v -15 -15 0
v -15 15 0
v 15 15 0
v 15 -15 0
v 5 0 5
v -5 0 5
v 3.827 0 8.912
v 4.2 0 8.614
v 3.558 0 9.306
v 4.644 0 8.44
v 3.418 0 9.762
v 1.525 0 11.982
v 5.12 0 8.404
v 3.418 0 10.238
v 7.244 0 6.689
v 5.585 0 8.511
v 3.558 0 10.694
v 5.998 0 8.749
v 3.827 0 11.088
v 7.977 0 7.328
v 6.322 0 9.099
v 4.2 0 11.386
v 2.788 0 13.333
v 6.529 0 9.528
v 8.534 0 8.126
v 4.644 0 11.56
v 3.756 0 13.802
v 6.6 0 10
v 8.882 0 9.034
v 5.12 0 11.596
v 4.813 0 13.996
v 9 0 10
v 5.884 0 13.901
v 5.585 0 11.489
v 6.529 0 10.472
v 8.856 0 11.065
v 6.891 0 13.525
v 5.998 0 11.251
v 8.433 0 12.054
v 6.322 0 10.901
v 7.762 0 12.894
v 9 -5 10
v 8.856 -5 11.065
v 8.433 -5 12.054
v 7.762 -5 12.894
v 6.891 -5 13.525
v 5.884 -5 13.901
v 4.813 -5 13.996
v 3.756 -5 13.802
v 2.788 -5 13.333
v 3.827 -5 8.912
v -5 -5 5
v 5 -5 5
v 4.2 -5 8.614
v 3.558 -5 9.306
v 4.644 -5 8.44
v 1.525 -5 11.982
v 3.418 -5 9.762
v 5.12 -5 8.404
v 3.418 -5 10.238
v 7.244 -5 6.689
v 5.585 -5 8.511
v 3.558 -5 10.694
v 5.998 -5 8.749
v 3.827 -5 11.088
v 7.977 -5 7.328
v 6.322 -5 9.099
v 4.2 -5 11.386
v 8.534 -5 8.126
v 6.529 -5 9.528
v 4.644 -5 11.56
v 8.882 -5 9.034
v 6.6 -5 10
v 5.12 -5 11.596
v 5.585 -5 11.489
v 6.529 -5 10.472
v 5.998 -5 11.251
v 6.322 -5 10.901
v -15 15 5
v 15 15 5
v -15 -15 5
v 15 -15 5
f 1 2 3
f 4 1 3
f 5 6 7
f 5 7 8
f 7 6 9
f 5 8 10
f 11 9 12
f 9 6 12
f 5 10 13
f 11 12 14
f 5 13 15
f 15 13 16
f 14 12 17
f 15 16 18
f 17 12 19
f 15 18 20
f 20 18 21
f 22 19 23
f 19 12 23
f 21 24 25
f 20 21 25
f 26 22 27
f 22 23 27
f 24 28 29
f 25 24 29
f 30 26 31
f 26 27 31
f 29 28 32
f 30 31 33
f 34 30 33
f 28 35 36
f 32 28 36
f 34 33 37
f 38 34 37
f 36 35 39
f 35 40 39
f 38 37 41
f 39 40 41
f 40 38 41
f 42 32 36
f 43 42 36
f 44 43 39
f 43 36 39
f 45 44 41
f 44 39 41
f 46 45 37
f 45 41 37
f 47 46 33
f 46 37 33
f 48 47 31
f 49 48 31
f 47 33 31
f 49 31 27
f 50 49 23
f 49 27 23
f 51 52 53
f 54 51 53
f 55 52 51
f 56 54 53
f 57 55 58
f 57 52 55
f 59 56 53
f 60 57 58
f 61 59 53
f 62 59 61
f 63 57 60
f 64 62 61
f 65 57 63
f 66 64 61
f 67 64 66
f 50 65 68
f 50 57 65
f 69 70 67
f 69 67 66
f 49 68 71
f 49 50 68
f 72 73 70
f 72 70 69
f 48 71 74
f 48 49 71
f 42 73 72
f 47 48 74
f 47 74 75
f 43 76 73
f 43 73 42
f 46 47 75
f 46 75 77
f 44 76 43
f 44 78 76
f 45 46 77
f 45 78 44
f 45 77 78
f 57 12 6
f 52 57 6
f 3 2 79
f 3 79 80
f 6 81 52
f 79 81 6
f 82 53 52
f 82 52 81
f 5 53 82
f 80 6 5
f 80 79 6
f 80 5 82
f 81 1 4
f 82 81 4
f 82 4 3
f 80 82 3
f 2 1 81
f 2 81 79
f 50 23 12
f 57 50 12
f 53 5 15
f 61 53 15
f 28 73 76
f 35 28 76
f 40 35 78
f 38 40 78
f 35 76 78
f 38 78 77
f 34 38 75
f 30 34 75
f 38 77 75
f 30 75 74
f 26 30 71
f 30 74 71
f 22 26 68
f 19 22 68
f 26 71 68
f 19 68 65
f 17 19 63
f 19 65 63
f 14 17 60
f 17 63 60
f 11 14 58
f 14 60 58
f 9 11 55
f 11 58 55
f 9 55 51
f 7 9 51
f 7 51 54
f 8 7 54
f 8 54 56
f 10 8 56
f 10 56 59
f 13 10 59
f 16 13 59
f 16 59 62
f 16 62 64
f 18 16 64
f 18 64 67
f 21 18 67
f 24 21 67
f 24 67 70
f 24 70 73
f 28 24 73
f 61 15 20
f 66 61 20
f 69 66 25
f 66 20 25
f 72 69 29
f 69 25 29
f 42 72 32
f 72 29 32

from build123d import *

# Parameters (mm, degrees)
F0_W     = 30
F0_H     = 30
F1_DEPTH = 5
F3_DEPTH = 5
F4_R     = 1.6
F5_DEPTH = 20.001


with BuildPart() as f1:
    # F0 (on Top) → F1 (new body)
    with BuildSketch(Plane.XY):
        Rectangle(F0_W, F0_H)
    extrude(amount=F1_DEPTH)

    # F2 (on Front) → F3 (join)
    with BuildSketch(Plane.XZ):
        with BuildLine():
            Line((2.788165, 13.332835), (7.243725, 6.68855))
            ThreePointArc((7.243725, 6.68855), (8.533759, 8.12582), (9, 10))
            ThreePointArc((9, 10), (6.891119, 13.524723), (2.788165, 13.332835))
        make_face()
        with BuildLine():
            Line((5, 10), (5, 6))
            ThreePointArc((5, 6), (6.173499, 6.17601), (7.243725, 6.68855))
            Line((7.243725, 6.68855), (2.788165, 13.332835))
            Line((2.788165, 13.332835), (1.525476, 11.981839))
            ThreePointArc((1.525476, 11.981839), (1.1336, 11.02516), (1, 10))
            Line((1, 10), (5, 10))
        make_face()
        with BuildLine():
            ThreePointArc((1, 10), (2.171573, 7.171573), (5, 6))
            Line((5, 6), (5, 10))
            Line((5, 10), (1, 10))
        make_face()
        with BuildLine():
            Line((-3.147079, 5), (0, 5))
            Line((0, 5), (0, 10))
            Line((0, 10), (1, 10))
            ThreePointArc((1, 10), (1.1336, 11.02516), (1.525476, 11.981839))
            Line((1.525476, 11.981839), (-5, 5))
            Line((-5, 5), (-3.147079, 5))
        make_face()
        with BuildLine():
            Line((0, 10), (0, 5))
            Line((0, 5), (5, 5))
            Line((5, 5), (5, 6))
            ThreePointArc((5, 6), (2.171573, 7.171573), (1, 10))
            Line((1, 10), (0, 10))
        make_face()
        with BuildLine():
            Line((5, 6), (5, 5))
            Line((5, 5), (7.243725, 6.68855))
            ThreePointArc((7.243725, 6.68855), (6.173499, 6.17601), (5, 6))
        make_face()
    extrude(amount=F3_DEPTH)

    # F4 (on face) → F5 (cut, through all)
    with BuildSketch(Plane.XZ.offset(5)):
        with Locations((5, 10)):
            Circle(F4_R)
    extrude(amount=-F5_DEPTH, mode=Mode.SUBTRACT)


solid = f1.part
